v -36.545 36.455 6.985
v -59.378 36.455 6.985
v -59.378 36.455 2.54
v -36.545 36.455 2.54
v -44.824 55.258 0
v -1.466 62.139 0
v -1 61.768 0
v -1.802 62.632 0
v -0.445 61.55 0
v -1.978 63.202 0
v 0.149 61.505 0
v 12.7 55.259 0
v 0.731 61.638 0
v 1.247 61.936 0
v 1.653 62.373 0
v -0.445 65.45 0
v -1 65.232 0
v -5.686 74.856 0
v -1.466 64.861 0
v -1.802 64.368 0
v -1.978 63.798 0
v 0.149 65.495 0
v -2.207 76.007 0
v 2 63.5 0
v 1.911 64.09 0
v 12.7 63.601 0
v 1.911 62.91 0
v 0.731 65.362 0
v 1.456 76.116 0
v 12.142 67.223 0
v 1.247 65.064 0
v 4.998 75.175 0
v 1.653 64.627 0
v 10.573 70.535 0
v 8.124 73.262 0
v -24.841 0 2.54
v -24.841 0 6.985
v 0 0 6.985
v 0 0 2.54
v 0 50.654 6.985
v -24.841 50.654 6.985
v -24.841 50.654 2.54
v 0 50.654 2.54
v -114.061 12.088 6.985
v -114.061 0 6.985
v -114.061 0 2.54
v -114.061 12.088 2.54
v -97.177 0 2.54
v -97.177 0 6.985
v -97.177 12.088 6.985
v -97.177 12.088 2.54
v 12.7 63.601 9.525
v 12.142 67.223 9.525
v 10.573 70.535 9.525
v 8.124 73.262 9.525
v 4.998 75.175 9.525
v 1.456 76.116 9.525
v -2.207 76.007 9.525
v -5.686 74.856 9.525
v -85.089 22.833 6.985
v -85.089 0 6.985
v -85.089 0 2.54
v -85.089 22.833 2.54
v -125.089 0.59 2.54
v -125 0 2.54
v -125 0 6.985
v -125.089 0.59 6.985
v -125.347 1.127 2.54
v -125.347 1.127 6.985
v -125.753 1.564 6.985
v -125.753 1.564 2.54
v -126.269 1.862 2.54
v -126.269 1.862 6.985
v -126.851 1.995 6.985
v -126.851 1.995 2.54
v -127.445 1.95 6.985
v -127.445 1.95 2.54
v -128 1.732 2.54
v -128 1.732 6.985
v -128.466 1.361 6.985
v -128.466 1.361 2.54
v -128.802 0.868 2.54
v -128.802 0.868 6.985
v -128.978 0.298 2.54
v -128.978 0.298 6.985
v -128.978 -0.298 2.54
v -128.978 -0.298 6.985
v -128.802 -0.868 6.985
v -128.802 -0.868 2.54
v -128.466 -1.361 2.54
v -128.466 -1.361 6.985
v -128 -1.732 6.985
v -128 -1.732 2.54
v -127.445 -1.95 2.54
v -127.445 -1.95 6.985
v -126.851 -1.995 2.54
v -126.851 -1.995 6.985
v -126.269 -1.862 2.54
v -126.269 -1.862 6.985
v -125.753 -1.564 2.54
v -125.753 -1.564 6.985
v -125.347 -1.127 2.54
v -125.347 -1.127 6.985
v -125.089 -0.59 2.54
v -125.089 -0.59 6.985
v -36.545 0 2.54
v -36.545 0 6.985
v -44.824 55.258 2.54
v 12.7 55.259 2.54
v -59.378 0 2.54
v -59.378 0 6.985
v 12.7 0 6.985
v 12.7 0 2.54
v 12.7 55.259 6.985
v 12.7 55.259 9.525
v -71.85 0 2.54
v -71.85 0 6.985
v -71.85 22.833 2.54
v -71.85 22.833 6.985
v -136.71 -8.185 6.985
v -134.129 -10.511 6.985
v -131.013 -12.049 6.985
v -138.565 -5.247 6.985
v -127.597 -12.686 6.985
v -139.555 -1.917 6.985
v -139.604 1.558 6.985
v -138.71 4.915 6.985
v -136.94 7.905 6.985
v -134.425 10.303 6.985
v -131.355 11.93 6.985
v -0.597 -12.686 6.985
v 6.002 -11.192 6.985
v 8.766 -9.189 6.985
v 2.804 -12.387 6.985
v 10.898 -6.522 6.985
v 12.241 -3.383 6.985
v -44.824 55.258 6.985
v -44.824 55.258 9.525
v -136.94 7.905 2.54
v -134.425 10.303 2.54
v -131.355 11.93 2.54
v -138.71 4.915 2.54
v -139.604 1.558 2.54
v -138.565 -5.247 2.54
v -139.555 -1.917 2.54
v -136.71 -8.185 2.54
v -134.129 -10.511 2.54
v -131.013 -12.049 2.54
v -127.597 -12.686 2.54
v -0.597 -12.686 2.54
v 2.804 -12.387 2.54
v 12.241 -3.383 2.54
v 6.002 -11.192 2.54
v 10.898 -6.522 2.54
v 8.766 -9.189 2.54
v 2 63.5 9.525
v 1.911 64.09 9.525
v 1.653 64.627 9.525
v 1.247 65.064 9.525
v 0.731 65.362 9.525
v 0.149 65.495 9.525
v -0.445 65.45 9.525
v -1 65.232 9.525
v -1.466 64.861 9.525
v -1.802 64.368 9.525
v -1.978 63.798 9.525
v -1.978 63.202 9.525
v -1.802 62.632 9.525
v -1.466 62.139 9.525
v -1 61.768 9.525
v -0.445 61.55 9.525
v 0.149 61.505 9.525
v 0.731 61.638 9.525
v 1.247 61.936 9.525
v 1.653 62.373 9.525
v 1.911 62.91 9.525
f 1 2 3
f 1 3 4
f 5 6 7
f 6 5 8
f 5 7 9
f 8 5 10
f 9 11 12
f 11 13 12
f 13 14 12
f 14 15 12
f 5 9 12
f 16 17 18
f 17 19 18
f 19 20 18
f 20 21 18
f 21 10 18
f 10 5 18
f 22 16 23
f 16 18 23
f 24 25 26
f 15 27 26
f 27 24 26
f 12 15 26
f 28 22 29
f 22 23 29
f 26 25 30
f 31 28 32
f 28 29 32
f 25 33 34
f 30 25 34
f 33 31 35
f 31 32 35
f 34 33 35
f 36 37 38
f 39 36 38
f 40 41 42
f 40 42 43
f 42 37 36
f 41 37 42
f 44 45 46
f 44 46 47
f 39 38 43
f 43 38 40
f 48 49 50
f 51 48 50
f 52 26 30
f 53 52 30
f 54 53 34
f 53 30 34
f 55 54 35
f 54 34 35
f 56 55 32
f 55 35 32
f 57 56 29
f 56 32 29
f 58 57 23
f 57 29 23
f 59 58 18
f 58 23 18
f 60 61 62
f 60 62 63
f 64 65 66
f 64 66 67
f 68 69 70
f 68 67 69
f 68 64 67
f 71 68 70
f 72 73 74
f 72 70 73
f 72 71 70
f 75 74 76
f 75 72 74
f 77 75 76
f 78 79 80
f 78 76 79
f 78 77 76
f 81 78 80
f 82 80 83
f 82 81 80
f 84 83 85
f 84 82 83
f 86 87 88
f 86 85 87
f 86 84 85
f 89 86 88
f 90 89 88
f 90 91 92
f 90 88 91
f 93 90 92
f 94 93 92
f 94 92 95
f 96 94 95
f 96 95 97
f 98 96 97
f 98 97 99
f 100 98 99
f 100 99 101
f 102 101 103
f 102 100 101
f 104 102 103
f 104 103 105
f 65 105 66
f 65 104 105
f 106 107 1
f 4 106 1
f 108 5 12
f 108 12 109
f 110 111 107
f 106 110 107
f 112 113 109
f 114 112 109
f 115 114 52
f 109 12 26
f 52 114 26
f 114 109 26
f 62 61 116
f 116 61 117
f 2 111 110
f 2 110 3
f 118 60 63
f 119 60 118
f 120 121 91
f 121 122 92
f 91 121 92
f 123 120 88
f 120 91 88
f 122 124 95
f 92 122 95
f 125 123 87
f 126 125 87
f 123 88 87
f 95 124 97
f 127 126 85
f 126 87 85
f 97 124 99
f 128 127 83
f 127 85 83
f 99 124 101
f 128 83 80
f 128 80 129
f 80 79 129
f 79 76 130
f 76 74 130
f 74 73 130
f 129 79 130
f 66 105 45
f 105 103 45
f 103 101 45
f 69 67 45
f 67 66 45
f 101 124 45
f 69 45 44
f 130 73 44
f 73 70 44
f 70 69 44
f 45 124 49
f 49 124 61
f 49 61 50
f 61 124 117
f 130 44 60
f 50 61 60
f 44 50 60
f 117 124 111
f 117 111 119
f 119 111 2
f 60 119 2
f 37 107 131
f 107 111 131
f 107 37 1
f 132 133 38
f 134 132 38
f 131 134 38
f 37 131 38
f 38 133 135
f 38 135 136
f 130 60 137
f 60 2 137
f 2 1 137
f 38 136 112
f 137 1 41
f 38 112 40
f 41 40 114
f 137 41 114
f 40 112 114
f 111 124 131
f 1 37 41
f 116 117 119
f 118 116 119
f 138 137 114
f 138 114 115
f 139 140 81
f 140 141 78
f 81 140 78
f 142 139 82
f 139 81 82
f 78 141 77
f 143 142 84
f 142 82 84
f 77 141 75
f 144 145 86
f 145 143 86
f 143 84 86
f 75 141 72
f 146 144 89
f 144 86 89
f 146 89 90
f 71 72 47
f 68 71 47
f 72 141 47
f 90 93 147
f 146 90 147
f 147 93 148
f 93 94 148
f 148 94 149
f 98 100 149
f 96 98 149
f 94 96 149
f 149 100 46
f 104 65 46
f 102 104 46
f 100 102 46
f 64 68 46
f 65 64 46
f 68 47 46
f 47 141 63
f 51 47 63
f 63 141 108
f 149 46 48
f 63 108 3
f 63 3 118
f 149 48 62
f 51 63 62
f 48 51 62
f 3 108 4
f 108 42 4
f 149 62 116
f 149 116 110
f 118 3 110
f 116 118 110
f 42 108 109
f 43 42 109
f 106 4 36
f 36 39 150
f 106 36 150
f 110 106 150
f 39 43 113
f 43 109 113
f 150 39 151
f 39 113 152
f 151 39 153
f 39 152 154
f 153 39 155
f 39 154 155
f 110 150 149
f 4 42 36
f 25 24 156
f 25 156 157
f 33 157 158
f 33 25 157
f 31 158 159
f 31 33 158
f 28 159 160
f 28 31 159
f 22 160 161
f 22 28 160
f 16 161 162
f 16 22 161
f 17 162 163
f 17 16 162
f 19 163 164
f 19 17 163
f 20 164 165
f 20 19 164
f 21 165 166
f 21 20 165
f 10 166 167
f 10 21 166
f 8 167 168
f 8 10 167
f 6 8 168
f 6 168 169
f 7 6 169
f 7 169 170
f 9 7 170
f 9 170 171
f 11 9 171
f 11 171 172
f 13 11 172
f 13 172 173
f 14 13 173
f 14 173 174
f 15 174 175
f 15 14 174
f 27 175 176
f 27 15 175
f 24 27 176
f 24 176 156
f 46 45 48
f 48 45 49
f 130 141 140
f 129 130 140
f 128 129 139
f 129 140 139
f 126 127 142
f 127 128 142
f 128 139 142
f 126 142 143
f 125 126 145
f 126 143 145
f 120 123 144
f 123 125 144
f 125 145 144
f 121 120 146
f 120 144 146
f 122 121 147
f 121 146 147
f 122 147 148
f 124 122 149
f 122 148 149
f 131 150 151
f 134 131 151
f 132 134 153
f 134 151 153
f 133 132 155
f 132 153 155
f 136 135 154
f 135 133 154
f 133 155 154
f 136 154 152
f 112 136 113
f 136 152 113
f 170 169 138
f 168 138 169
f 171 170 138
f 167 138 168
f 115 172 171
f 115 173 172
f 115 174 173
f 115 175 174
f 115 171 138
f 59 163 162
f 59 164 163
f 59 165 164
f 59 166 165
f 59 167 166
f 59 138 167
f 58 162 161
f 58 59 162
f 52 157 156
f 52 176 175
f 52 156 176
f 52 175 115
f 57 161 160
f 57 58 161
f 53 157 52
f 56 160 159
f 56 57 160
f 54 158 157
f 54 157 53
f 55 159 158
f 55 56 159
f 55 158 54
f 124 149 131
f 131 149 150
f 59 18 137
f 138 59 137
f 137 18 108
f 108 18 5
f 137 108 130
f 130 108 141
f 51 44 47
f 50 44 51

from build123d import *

# Parameters (mm, degrees)
F0_R     = 2.00025
F1_DEPTH = 9.525
F2_W     = 55.258708
F2_H     = 2.54
F2_W_2   = 16.308993
F3_DEPTH = 152.40108
F4_W     = 16.884602
F4_H     = 12.087842
F4_W_2   = 13.239063
F4_H_2   = 22.832589
F4_W_3   = 22.832591
F4_H_3   = 36.455397
F4_W_4   = 24.841385
F4_H_4   = 50.653815
F5_DEPTH = 25.4


with BuildPart() as f1:
    # F0 (on Top) → F1 (new body)
    with BuildSketch(Plane.XY):
        with BuildLine():
            Line((12.7, 0), (12.699599, 63.600882))
            ThreePointArc((12.699599, 63.600882), (6.63067, 74.33163), (-5.686228, 74.855915))
            Line((-5.686228, 74.855915), (-131.355282, 11.929858))
            ThreePointArc((-131.355282, 11.929858), (-139.554552, -1.916565), (-127.59746, -12.685939))
            Line((-127.59746, -12.685939), (-0.59746, -12.685939))
            ThreePointArc((-0.59746, -12.685939), (8.766478, -9.189063), (12.7, 0))
        make_face()
        with Locations((-127, 0)):
            Circle(F0_R, mode=Mode.SUBTRACT)
        with Locations((0, 63.5)):
            Circle(F0_R, mode=Mode.SUBTRACT)
    extrude(amount=F1_DEPTH)

    # F2 (on face) → F3 (cut, through all)
    with BuildSketch(Plane(origin=(12.7, 8e-05, 0), x_dir=(-6e-06, 1, 0), z_dir=(1, 6e-06, 0))):
        with Locations((27.629274, 8.255)):
            Rectangle(F2_W, F2_H)
        with Locations((27.629274, 1.27)):
            Rectangle(F2_W, F2_H)
        with Locations((-8.154576, 1.27)):
            Rectangle(F2_W_2, F2_H)
        with Locations((-8.154576, 8.255)):
            Rectangle(F2_W_2, F2_H)
    extrude(amount=-F3_DEPTH, mode=Mode.SUBTRACT)

    # F4 (on face) → F5 (cut)
    with BuildSketch(Plane.XY.offset(6.985)):
        with Locations((-105.618868, 6.043921)):
            Rectangle(F4_W, F4_H)
        with Locations((-78.46919, 11.416294)):
            Rectangle(F4_W_2, F4_H_2)
        with Locations((-47.961781, 18.227698)):
            Rectangle(F4_W_3, F4_H_3)
        with Locations((-12.420692, 25.326907)):
            Rectangle(F4_W_4, F4_H_4)
    extrude(amount=-F5_DEPTH, mode=Mode.SUBTRACT)


solid = f1.part
